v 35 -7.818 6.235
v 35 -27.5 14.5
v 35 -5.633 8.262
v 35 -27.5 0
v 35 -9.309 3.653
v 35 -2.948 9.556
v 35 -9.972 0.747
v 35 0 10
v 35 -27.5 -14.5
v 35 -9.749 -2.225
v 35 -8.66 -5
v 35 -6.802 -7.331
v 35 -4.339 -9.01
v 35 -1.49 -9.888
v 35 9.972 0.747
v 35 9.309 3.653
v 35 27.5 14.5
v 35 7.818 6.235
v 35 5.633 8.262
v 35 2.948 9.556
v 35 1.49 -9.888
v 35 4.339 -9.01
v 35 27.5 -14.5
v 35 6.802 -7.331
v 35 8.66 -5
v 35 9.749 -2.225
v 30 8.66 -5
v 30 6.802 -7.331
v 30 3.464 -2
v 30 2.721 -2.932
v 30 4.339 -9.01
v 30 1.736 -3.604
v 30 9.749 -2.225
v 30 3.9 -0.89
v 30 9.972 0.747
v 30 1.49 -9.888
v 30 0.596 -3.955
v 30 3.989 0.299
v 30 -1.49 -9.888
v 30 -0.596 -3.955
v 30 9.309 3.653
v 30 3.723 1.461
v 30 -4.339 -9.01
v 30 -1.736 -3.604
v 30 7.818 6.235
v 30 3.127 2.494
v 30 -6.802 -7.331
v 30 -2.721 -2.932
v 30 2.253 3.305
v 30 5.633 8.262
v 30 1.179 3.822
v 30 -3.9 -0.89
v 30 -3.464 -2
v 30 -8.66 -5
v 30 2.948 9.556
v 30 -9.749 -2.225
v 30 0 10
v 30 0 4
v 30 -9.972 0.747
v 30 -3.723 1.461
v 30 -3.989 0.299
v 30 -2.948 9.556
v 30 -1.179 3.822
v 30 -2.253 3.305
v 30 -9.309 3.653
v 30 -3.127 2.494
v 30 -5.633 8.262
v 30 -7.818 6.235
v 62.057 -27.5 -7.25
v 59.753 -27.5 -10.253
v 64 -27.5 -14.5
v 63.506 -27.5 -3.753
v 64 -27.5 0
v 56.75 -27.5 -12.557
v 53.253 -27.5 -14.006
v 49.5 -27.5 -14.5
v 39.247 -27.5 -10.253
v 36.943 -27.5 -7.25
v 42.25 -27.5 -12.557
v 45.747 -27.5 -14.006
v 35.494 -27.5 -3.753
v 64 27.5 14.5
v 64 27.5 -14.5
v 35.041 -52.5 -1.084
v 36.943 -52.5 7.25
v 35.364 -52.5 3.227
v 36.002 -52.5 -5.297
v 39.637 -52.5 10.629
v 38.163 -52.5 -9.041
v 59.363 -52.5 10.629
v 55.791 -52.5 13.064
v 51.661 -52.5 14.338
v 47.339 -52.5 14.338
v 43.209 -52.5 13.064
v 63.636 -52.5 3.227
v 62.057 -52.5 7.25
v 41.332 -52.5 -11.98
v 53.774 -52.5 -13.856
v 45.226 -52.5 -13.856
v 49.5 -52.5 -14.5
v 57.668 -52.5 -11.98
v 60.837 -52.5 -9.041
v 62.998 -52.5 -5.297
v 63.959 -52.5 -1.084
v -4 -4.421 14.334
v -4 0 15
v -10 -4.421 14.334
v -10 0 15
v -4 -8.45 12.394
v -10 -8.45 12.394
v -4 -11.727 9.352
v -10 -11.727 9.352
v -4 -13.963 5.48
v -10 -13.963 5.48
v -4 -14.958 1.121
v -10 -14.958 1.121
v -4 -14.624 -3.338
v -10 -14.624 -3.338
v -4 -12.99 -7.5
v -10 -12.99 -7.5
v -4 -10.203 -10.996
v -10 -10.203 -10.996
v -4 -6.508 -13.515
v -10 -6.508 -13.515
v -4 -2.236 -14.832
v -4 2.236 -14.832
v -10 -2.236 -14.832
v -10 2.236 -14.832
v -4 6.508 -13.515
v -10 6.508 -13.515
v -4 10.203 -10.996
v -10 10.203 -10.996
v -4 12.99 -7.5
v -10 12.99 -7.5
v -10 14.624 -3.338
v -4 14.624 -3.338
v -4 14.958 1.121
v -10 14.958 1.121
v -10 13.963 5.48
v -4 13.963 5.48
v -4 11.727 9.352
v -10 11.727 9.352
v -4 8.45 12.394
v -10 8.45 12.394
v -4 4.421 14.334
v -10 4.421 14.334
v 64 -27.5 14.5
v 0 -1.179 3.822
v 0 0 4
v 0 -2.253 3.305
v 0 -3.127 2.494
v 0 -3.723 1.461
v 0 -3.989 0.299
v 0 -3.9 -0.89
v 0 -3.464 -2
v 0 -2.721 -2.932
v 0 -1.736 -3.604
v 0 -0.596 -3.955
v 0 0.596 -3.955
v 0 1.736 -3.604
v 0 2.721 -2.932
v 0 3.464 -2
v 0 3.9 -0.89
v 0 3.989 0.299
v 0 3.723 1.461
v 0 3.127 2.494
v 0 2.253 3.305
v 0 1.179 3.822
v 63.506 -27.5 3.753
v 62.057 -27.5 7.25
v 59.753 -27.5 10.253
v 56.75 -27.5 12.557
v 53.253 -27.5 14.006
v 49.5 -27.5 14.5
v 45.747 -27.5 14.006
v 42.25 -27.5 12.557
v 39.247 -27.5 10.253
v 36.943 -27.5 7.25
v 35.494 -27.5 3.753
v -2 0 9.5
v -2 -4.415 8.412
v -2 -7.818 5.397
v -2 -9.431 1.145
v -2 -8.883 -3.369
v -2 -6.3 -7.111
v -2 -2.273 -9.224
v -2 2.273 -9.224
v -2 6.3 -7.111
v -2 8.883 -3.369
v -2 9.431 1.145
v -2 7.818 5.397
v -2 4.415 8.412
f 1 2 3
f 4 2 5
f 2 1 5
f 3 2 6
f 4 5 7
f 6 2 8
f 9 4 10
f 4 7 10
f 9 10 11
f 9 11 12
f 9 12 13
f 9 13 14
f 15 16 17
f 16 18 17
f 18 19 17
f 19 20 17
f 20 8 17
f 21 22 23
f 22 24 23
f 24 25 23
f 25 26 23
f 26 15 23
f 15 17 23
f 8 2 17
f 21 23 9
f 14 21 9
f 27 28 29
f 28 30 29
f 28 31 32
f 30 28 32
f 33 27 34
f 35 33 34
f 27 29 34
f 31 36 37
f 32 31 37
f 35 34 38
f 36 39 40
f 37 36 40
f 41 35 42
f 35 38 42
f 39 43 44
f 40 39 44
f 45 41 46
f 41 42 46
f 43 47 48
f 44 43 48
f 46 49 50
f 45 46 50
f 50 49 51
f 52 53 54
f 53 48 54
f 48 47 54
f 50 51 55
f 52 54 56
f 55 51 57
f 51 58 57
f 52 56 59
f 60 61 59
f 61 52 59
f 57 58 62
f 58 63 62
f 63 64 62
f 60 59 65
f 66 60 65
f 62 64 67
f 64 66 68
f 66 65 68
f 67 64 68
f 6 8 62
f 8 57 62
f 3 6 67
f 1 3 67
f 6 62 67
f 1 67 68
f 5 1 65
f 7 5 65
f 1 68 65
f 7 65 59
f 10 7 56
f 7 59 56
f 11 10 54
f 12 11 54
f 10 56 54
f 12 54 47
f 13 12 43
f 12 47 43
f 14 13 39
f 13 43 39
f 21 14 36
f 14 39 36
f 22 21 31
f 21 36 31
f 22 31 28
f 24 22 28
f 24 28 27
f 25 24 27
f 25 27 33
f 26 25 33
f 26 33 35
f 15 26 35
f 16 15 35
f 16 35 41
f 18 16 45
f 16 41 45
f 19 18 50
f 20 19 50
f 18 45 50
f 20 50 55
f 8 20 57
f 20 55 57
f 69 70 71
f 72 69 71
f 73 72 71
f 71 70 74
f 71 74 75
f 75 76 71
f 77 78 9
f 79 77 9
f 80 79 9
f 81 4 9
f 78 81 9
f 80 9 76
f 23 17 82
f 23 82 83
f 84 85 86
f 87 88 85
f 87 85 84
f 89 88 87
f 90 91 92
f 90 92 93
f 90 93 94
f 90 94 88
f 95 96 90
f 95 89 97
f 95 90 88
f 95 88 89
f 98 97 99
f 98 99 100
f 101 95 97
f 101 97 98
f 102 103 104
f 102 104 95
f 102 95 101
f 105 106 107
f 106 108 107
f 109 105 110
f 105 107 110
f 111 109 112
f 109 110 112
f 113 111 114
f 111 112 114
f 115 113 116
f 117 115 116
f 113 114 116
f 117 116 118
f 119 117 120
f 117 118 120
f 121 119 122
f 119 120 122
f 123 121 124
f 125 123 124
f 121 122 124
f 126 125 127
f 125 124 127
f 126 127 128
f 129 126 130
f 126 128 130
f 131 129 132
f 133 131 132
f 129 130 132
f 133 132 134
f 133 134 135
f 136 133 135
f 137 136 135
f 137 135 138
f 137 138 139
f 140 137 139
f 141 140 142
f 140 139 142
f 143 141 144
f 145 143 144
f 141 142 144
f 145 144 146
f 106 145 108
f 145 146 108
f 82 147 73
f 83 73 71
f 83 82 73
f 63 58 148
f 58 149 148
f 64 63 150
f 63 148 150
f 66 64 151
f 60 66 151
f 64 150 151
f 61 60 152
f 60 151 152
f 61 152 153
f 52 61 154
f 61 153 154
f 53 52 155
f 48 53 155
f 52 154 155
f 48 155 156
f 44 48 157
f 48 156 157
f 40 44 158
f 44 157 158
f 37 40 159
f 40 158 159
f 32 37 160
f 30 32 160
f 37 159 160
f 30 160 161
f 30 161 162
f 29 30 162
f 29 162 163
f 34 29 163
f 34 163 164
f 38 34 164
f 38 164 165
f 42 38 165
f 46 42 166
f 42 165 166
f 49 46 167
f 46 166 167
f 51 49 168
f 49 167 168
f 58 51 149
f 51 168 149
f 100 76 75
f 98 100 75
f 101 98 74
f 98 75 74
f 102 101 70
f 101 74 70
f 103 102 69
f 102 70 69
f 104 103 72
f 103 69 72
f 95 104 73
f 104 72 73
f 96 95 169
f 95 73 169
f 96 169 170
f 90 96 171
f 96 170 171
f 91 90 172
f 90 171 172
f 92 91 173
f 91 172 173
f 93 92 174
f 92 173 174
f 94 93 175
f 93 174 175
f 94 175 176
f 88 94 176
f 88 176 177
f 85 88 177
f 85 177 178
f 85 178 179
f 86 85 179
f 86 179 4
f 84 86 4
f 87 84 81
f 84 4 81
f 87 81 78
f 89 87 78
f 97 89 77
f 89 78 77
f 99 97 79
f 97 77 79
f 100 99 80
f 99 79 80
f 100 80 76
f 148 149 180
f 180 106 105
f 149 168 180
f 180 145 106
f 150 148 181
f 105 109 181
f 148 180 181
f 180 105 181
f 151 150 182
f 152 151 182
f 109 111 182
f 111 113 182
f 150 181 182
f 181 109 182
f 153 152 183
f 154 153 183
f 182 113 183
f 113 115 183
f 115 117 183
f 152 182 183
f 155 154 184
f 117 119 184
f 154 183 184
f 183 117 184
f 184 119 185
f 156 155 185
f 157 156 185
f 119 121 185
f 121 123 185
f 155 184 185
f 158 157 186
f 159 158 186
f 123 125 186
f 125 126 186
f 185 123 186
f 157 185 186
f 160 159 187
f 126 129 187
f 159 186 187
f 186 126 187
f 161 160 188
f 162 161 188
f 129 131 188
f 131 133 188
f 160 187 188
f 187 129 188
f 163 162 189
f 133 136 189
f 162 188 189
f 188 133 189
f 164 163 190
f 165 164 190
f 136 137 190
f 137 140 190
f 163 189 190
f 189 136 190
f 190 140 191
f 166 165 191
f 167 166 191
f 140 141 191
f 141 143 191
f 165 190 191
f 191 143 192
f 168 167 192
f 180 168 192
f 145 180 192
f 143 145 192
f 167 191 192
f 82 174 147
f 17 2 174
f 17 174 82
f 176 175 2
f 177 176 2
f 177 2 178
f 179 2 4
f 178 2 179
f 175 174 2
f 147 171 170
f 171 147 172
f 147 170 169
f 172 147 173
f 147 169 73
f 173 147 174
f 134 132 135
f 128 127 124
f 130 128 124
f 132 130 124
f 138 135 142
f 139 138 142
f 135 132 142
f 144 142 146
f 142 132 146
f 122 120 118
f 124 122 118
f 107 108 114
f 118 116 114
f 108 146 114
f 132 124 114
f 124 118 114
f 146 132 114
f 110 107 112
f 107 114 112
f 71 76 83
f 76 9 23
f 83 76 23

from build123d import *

# Parameters (mm, degrees)
SKETCH_2_W      = 29
SKETCH_2_H      = 55
EXTRUDE_1_DEPTH = 29
SKETCH_3_R      = 14.5
EXTRUDE_2_DEPTH = 25


with BuildPart() as part:
    # 草图1 → 旋转3 (revolve)
    with BuildSketch(Plane.XY, mode=Mode.PRIVATE) as revolve_3_sk:
        Polygon((-10, 15), (-10, 0), (35, 0), (35, 10), (30, 10), (30, 4), (0, 4), (-4, 15), align=None)
    revolve(revolve_3_sk.sketch.rotate(Axis((-10, 0, 0), (1, 0, 0)), 90), axis=Axis((-10, 0, 0), (1, 0, 0)))

    # 草图2 → 凸台-拉伸1 (add)
    with BuildSketch(Plane(origin=(35, 0, 0), x_dir=(0, 0, -1), z_dir=(1, 0, 0))):
        Rectangle(SKETCH_2_W, SKETCH_2_H)
    extrude(amount=EXTRUDE_1_DEPTH)

    # 草图3 → 凸台-拉伸2 (add)
    with BuildSketch(Plane.XZ.offset(27.5)):
        with Locations(Location((49.5, 0, 0), (0, 0, 270))):
            Circle(SKETCH_3_R)
    extrude(amount=EXTRUDE_2_DEPTH)


solid = part.part
